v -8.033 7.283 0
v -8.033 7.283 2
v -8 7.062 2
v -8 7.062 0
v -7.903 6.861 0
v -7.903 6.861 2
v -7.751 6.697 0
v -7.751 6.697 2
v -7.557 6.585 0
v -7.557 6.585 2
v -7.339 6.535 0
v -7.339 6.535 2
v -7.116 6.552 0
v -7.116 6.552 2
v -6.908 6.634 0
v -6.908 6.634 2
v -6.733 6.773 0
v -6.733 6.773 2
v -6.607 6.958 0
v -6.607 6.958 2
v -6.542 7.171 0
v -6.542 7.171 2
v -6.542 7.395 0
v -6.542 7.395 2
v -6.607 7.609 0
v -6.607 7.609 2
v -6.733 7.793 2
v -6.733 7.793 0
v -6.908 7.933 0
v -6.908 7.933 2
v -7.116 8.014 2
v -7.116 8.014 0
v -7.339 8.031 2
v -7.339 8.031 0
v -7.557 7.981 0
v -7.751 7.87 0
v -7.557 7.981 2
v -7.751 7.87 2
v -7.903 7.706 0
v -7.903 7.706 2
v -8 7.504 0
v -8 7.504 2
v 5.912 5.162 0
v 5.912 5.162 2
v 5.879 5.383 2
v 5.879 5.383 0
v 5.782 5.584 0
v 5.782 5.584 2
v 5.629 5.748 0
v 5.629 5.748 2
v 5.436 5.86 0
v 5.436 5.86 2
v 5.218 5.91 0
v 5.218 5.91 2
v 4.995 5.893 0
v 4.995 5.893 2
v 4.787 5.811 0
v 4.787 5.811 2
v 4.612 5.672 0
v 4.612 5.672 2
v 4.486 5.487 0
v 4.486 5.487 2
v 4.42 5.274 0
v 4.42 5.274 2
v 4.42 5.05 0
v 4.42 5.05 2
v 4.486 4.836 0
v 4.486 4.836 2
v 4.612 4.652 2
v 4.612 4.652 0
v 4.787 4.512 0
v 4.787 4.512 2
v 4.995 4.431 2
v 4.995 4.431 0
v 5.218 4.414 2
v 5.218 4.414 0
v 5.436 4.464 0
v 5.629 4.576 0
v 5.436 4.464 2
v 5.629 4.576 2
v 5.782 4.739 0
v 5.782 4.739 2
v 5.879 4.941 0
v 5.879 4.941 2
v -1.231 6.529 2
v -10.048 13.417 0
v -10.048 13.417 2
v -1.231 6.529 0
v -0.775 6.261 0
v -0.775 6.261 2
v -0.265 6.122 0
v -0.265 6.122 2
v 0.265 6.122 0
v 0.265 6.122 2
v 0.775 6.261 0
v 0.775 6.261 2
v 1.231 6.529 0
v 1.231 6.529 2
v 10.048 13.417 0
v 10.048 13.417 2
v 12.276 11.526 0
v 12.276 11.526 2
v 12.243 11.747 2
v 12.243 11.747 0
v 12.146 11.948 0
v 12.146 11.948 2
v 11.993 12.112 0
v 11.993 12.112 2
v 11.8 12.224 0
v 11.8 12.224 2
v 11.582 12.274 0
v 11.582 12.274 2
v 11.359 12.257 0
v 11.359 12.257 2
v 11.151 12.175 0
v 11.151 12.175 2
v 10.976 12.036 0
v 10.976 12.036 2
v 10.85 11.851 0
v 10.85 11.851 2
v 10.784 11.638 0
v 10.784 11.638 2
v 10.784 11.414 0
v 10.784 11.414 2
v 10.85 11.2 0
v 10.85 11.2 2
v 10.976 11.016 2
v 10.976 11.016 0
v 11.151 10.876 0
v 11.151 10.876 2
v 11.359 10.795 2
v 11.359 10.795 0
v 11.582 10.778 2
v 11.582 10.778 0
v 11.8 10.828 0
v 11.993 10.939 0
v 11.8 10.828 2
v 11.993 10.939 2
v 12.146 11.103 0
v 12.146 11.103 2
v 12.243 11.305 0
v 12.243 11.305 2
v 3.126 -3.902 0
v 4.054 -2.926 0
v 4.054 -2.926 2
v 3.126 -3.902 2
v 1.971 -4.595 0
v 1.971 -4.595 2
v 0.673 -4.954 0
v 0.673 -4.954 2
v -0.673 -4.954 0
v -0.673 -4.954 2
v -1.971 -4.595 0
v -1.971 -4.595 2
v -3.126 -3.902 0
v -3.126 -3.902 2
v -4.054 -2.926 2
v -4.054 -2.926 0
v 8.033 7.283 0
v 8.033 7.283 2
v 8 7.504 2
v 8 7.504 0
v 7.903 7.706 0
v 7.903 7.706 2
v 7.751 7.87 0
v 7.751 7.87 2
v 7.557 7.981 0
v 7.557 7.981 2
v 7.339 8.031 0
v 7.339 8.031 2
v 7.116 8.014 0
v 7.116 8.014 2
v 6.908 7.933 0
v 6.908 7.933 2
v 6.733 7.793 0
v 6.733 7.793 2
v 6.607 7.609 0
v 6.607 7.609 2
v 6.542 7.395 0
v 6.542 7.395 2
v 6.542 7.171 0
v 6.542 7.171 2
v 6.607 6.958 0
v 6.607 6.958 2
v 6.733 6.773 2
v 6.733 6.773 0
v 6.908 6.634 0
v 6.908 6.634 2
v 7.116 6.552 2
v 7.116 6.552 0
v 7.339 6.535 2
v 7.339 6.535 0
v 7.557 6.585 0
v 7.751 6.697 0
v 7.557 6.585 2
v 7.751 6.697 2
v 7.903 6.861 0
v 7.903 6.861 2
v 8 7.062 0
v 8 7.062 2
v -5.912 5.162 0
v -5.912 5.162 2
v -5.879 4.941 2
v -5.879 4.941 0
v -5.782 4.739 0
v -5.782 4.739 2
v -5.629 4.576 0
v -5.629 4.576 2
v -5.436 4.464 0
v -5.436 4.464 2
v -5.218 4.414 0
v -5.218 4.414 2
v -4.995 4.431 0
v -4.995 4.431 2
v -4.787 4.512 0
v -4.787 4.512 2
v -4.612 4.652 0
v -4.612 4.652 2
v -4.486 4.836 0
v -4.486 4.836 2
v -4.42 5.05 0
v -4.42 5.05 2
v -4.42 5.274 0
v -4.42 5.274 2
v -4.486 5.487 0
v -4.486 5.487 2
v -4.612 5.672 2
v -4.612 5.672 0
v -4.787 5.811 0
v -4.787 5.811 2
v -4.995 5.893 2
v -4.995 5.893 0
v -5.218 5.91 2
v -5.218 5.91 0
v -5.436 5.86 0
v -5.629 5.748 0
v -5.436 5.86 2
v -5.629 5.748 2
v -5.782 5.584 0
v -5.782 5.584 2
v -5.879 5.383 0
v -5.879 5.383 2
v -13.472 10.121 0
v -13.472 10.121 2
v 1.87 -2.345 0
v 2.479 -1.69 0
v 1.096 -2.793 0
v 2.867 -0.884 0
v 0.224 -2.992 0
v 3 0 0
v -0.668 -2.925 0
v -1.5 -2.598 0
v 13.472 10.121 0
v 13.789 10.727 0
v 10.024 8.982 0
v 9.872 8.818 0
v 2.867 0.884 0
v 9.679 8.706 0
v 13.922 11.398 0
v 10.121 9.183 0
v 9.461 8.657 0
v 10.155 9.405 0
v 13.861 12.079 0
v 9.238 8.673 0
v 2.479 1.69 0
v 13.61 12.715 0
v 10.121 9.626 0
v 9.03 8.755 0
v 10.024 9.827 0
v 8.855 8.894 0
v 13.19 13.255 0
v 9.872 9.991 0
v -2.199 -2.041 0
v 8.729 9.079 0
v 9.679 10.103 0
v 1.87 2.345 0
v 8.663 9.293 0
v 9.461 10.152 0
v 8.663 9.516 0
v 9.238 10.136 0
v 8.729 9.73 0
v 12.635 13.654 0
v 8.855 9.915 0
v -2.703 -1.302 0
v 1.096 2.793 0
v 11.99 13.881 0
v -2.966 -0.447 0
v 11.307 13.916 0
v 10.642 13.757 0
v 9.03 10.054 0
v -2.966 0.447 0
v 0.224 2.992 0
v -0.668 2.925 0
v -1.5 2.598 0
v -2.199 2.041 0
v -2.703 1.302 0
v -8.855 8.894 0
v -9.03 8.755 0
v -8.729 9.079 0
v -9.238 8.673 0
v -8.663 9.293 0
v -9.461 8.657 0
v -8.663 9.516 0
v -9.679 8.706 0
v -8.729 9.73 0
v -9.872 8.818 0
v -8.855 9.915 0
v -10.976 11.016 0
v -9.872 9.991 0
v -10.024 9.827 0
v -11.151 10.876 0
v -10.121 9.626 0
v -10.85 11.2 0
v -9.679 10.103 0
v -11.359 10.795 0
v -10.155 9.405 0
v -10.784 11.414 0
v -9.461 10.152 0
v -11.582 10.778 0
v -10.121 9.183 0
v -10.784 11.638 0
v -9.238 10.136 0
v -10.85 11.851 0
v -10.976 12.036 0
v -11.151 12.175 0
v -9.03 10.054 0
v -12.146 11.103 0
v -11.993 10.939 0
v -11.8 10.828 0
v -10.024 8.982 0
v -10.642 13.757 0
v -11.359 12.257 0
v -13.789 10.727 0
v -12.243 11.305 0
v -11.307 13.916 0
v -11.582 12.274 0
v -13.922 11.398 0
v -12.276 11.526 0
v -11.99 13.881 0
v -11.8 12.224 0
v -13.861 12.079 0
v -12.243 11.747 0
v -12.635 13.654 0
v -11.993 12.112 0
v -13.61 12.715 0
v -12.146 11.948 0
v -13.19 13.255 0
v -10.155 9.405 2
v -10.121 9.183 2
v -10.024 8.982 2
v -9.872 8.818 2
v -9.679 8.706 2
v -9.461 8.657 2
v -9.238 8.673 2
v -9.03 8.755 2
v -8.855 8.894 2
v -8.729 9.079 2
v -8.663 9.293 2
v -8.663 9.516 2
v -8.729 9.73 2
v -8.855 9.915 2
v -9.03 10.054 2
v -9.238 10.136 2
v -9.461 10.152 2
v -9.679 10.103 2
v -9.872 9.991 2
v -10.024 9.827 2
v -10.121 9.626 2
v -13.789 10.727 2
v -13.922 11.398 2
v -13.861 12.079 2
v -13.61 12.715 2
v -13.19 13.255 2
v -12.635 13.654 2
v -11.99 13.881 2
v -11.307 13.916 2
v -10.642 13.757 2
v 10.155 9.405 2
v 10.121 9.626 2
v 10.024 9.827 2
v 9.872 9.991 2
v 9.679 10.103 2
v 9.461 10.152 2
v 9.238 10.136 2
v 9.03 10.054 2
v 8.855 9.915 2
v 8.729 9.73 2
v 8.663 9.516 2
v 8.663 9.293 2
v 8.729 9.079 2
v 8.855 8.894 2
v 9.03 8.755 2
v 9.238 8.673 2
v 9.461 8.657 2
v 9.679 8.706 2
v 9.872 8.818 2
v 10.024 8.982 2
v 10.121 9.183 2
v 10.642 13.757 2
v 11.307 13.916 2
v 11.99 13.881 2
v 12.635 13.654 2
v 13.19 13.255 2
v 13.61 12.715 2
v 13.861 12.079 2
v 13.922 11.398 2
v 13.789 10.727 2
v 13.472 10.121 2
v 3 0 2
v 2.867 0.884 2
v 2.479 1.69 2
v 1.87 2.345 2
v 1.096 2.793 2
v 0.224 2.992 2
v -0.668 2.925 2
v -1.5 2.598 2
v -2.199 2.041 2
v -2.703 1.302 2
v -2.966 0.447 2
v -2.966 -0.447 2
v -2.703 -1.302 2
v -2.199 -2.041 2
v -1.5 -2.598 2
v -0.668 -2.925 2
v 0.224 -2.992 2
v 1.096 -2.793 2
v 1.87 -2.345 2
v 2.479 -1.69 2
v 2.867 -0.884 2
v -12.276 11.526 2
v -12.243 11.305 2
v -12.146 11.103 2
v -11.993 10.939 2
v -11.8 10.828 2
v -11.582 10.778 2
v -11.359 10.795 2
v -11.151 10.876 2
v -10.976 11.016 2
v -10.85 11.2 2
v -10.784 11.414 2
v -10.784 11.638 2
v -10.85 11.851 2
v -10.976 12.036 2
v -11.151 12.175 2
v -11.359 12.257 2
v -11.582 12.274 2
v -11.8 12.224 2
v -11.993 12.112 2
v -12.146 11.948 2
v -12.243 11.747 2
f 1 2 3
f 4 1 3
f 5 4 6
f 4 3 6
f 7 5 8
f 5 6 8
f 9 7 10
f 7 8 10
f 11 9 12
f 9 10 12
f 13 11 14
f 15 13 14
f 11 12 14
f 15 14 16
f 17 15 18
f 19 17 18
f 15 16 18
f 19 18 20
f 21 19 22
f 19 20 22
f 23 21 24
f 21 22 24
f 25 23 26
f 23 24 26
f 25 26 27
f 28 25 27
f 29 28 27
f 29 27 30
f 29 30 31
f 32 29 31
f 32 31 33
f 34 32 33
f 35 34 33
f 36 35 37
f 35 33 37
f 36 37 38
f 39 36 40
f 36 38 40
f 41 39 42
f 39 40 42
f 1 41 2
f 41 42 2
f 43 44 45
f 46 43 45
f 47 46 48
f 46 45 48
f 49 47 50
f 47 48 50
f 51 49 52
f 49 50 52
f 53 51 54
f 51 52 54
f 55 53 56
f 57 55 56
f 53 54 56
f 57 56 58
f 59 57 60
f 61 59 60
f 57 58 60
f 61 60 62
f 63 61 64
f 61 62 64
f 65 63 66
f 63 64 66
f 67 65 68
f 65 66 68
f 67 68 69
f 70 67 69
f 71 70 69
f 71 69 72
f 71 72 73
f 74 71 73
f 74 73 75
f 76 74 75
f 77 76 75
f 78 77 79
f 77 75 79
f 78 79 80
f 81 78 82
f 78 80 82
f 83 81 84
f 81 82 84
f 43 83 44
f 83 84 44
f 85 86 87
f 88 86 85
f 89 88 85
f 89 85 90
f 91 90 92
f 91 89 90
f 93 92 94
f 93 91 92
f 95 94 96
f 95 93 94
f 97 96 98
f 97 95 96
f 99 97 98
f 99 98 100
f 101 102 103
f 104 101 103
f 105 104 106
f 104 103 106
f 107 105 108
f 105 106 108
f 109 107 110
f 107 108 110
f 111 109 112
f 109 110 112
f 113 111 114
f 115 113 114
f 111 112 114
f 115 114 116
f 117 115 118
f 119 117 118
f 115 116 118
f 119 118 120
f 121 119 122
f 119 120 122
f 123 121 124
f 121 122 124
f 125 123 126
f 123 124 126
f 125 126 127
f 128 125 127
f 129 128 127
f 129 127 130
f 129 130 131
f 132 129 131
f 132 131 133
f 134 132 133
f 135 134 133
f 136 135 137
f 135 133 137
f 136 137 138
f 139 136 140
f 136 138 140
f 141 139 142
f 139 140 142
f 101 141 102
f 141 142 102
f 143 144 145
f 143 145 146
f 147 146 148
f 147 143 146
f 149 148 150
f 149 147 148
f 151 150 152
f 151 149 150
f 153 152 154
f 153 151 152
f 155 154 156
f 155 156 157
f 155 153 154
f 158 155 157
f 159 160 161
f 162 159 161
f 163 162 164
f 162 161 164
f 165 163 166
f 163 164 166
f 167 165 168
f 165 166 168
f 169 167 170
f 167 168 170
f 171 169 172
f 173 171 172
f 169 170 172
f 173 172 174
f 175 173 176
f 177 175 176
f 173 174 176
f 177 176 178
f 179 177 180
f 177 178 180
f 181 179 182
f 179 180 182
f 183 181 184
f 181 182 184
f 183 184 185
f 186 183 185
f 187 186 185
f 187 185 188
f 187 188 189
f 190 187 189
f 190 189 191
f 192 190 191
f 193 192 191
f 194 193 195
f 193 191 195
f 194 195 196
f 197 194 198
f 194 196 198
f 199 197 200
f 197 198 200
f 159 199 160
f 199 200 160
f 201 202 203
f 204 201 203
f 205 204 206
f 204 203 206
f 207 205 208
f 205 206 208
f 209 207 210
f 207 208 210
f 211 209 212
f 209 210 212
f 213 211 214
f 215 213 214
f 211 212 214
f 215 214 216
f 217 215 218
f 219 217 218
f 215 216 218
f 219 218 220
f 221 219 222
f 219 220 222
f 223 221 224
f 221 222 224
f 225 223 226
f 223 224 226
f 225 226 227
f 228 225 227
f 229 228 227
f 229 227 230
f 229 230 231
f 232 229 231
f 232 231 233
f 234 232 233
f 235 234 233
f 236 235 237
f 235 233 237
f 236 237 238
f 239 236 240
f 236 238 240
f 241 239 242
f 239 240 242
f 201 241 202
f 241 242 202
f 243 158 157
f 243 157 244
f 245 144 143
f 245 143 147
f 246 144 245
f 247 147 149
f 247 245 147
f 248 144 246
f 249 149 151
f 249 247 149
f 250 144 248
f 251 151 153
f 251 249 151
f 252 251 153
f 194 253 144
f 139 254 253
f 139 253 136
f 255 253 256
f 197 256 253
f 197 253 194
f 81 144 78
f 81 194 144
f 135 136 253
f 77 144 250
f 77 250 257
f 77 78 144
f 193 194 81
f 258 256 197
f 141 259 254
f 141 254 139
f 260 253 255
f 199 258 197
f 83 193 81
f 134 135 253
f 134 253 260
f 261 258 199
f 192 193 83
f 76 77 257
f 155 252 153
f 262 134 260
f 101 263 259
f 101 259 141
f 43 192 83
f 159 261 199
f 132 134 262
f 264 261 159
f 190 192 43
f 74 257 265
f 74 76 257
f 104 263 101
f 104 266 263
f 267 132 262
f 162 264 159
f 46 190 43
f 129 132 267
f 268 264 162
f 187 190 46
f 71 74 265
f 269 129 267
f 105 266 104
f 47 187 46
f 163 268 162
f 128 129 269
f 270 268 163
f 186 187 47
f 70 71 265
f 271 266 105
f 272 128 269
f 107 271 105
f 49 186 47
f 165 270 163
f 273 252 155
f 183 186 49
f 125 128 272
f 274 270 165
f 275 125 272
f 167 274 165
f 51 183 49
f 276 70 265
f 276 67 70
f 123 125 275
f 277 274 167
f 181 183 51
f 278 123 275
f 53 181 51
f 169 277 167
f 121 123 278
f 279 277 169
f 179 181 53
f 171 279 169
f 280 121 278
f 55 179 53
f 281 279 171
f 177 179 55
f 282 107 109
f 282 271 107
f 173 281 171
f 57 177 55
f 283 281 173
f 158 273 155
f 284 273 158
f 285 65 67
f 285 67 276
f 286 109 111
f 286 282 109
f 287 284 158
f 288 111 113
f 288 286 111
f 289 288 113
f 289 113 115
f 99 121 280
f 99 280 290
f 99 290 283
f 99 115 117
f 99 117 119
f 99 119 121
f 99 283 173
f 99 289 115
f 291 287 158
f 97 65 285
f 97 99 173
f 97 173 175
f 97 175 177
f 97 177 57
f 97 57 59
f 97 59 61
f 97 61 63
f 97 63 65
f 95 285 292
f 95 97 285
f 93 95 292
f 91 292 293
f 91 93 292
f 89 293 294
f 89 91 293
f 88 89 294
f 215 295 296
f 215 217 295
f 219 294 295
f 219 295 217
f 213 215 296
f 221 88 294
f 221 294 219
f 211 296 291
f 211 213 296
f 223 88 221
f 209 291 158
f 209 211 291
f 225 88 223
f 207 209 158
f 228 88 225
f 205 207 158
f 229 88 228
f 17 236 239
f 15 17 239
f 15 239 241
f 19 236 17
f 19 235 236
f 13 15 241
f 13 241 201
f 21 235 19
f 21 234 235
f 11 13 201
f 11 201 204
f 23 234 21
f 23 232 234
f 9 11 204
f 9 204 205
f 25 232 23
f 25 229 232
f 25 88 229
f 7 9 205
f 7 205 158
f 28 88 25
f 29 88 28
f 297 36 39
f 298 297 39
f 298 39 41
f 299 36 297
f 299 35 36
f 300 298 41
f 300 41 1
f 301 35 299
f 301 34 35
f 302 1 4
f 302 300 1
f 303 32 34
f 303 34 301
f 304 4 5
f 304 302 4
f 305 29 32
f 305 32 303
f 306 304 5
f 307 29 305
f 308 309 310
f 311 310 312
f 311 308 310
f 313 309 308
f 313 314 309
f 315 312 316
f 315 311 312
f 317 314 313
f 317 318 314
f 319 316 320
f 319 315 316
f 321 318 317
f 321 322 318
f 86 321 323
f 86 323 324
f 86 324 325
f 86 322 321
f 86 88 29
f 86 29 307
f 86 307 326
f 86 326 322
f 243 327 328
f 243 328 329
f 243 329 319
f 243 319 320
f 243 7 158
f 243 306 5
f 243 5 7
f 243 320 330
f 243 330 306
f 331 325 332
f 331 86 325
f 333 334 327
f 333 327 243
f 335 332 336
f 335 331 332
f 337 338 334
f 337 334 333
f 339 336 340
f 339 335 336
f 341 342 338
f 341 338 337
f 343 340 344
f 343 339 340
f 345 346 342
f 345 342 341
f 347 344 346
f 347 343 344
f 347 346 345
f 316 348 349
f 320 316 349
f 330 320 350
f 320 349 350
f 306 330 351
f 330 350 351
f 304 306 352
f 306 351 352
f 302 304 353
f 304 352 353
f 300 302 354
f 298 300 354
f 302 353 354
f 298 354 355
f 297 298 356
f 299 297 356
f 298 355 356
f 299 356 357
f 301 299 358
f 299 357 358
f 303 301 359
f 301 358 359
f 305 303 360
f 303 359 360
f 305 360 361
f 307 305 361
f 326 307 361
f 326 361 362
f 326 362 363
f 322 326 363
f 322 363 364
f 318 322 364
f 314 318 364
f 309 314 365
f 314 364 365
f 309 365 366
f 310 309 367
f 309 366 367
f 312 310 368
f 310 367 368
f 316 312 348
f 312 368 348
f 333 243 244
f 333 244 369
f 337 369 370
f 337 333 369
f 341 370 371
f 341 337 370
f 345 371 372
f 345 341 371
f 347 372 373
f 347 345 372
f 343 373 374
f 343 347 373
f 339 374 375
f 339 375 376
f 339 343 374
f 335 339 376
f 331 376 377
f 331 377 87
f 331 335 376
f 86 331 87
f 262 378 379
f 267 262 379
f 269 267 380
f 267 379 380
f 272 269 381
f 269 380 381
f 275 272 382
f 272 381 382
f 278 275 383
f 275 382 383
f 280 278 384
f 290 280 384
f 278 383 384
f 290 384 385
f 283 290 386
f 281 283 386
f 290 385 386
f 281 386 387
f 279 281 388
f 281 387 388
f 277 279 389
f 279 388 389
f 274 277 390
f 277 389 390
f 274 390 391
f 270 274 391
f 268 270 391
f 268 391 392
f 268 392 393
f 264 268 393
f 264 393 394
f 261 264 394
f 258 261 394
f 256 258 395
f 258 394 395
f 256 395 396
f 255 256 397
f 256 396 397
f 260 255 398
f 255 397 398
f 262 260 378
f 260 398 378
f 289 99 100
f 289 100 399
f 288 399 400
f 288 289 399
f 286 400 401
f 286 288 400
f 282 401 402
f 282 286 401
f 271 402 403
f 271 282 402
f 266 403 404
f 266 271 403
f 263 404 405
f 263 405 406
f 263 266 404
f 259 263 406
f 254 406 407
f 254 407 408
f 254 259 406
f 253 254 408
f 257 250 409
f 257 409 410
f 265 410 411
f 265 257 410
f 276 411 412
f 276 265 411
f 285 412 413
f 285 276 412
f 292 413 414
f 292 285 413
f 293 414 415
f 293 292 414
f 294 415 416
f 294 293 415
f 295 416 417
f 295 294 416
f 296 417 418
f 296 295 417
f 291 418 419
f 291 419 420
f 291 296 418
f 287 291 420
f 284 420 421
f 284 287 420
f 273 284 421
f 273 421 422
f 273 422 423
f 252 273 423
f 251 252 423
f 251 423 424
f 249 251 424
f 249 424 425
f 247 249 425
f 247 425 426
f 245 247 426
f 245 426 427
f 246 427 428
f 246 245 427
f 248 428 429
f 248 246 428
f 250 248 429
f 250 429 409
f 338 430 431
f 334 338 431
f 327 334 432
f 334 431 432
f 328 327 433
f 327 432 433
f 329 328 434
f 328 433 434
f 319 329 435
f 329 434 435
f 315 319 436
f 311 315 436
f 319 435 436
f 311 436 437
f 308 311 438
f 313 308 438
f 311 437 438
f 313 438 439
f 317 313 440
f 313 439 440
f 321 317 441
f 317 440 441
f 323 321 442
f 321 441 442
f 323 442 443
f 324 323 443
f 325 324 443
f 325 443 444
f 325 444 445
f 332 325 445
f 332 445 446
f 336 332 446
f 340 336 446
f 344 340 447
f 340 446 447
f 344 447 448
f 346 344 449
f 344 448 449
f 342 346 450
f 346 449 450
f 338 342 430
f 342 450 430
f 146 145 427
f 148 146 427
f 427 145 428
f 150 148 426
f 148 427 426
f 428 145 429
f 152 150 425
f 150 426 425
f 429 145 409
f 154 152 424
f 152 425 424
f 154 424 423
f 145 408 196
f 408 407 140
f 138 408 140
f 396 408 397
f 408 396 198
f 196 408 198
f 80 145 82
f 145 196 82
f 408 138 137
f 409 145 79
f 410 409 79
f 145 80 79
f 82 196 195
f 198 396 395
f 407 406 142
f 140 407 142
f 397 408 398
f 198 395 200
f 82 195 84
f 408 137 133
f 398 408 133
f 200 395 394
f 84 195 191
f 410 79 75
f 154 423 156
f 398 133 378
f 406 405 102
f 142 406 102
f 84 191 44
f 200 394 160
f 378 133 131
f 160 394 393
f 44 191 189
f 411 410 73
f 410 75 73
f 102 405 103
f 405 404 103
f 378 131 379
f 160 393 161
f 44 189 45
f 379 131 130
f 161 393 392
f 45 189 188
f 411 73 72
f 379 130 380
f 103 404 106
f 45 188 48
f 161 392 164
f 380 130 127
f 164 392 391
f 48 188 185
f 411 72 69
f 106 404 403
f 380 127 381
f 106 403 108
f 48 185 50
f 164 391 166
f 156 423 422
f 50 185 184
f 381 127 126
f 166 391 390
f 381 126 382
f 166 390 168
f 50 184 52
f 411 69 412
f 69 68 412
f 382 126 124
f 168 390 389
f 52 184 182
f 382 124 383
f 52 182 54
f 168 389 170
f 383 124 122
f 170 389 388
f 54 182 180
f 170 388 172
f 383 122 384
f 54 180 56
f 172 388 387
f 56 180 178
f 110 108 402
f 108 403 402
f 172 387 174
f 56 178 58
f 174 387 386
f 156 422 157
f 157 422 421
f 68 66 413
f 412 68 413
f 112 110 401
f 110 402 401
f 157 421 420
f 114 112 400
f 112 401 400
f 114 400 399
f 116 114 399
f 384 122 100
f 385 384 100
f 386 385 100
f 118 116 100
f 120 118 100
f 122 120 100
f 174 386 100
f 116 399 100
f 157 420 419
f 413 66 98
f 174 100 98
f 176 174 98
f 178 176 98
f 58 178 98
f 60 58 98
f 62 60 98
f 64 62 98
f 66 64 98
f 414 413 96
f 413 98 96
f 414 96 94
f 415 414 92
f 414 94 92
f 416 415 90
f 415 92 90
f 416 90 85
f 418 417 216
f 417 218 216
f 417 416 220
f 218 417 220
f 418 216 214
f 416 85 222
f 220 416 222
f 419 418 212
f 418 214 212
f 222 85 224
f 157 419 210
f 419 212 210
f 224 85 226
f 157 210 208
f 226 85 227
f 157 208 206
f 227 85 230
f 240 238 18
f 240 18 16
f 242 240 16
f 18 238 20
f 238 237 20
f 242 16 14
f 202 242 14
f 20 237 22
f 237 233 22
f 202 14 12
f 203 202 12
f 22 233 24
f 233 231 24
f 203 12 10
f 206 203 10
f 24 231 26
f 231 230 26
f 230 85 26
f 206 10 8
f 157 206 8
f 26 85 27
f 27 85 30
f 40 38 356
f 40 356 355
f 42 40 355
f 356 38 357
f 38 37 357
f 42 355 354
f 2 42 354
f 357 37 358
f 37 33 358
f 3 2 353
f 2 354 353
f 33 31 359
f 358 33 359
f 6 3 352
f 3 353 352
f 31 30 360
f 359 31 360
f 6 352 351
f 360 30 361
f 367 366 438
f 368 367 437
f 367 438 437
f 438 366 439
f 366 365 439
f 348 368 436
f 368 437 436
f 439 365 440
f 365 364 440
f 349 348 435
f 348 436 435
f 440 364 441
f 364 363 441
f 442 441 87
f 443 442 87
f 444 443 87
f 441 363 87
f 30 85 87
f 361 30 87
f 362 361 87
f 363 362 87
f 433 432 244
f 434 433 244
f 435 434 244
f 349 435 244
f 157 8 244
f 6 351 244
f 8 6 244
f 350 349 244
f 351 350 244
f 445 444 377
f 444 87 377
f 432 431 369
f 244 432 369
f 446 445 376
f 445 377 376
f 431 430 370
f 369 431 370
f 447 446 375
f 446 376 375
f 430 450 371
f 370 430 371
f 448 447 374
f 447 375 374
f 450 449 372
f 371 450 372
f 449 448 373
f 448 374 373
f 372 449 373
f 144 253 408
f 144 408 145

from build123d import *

# Parameters (mm, degrees)
SKETCH1_R      = 3
EXTRUDE1_DEPTH = 2
SKETCH2_R      = 0.75
EXTRUDE2_DEPTH = 2


with BuildPart() as part:
    # Sketch1 → Extrude1 (new body)
    with BuildSketch(Plane.XY):
        with BuildLine():
            Line((13.471864542, 10.121208711), (4.054216685, -2.926316298))
            ThreePointArc((4.054216685, -2.926316298), (0, -5), (-4.054216685, -2.926316298))
            Line((-4.054216685, -2.926316298), (-13.471864542, 10.121208711))
            ThreePointArc((-13.471864542, 10.121208711), (-13.190330714, 13.254849624), (-10.048252993, 13.417066342))
            Line((-10.048252993, 13.417066342), (-1.231322951, 6.52852563))
            ThreePointArc((-1.231322951, 6.52852563), (0, 6.104547138), (1.231322951, 6.52852563))
            Line((1.231322951, 6.52852563), (10.048252993, 13.417066342))
            ThreePointArc((10.048252993, 13.417066342), (13.190330714, 13.254849624), (13.471864542, 10.121208711))
        make_face()
        Circle(SKETCH1_R, mode=Mode.SUBTRACT)
    extrude(amount=EXTRUDE1_DEPTH)

    # Sketch2 → Extrude2 (cut)
    with BuildSketch(Plane.XY.offset(2)):
        with Locations((11.525840533, 11.525840533)):
            Circle(SKETCH2_R)
        with Locations((9.40452019, 9.40452019)):
            Circle(SKETCH2_R)
        with Locations((7.283199846, 7.283199846)):
            Circle(SKETCH2_R)
        with Locations((5.161879503, 5.161879503)):
            Circle(SKETCH2_R)
        with Locations(Location((-5.161879503, 5.161879503, 0), (0, 0, 180))):
            Circle(SKETCH2_R)
        with Locations(Location((-7.283199846, 7.283199846, 0), (0, 0, 180))):
            Circle(SKETCH2_R)
        with Locations(Location((-9.40452019, 9.40452019, 0), (0, 0, 180))):
            Circle(SKETCH2_R)
        with Locations(Location((-11.525840533, 11.525840533, 0), (0, 0, 180))):
            Circle(SKETCH2_R)
    extrude(amount=-EXTRUDE2_DEPTH, mode=Mode.SUBTRACT)


solid = part.part
